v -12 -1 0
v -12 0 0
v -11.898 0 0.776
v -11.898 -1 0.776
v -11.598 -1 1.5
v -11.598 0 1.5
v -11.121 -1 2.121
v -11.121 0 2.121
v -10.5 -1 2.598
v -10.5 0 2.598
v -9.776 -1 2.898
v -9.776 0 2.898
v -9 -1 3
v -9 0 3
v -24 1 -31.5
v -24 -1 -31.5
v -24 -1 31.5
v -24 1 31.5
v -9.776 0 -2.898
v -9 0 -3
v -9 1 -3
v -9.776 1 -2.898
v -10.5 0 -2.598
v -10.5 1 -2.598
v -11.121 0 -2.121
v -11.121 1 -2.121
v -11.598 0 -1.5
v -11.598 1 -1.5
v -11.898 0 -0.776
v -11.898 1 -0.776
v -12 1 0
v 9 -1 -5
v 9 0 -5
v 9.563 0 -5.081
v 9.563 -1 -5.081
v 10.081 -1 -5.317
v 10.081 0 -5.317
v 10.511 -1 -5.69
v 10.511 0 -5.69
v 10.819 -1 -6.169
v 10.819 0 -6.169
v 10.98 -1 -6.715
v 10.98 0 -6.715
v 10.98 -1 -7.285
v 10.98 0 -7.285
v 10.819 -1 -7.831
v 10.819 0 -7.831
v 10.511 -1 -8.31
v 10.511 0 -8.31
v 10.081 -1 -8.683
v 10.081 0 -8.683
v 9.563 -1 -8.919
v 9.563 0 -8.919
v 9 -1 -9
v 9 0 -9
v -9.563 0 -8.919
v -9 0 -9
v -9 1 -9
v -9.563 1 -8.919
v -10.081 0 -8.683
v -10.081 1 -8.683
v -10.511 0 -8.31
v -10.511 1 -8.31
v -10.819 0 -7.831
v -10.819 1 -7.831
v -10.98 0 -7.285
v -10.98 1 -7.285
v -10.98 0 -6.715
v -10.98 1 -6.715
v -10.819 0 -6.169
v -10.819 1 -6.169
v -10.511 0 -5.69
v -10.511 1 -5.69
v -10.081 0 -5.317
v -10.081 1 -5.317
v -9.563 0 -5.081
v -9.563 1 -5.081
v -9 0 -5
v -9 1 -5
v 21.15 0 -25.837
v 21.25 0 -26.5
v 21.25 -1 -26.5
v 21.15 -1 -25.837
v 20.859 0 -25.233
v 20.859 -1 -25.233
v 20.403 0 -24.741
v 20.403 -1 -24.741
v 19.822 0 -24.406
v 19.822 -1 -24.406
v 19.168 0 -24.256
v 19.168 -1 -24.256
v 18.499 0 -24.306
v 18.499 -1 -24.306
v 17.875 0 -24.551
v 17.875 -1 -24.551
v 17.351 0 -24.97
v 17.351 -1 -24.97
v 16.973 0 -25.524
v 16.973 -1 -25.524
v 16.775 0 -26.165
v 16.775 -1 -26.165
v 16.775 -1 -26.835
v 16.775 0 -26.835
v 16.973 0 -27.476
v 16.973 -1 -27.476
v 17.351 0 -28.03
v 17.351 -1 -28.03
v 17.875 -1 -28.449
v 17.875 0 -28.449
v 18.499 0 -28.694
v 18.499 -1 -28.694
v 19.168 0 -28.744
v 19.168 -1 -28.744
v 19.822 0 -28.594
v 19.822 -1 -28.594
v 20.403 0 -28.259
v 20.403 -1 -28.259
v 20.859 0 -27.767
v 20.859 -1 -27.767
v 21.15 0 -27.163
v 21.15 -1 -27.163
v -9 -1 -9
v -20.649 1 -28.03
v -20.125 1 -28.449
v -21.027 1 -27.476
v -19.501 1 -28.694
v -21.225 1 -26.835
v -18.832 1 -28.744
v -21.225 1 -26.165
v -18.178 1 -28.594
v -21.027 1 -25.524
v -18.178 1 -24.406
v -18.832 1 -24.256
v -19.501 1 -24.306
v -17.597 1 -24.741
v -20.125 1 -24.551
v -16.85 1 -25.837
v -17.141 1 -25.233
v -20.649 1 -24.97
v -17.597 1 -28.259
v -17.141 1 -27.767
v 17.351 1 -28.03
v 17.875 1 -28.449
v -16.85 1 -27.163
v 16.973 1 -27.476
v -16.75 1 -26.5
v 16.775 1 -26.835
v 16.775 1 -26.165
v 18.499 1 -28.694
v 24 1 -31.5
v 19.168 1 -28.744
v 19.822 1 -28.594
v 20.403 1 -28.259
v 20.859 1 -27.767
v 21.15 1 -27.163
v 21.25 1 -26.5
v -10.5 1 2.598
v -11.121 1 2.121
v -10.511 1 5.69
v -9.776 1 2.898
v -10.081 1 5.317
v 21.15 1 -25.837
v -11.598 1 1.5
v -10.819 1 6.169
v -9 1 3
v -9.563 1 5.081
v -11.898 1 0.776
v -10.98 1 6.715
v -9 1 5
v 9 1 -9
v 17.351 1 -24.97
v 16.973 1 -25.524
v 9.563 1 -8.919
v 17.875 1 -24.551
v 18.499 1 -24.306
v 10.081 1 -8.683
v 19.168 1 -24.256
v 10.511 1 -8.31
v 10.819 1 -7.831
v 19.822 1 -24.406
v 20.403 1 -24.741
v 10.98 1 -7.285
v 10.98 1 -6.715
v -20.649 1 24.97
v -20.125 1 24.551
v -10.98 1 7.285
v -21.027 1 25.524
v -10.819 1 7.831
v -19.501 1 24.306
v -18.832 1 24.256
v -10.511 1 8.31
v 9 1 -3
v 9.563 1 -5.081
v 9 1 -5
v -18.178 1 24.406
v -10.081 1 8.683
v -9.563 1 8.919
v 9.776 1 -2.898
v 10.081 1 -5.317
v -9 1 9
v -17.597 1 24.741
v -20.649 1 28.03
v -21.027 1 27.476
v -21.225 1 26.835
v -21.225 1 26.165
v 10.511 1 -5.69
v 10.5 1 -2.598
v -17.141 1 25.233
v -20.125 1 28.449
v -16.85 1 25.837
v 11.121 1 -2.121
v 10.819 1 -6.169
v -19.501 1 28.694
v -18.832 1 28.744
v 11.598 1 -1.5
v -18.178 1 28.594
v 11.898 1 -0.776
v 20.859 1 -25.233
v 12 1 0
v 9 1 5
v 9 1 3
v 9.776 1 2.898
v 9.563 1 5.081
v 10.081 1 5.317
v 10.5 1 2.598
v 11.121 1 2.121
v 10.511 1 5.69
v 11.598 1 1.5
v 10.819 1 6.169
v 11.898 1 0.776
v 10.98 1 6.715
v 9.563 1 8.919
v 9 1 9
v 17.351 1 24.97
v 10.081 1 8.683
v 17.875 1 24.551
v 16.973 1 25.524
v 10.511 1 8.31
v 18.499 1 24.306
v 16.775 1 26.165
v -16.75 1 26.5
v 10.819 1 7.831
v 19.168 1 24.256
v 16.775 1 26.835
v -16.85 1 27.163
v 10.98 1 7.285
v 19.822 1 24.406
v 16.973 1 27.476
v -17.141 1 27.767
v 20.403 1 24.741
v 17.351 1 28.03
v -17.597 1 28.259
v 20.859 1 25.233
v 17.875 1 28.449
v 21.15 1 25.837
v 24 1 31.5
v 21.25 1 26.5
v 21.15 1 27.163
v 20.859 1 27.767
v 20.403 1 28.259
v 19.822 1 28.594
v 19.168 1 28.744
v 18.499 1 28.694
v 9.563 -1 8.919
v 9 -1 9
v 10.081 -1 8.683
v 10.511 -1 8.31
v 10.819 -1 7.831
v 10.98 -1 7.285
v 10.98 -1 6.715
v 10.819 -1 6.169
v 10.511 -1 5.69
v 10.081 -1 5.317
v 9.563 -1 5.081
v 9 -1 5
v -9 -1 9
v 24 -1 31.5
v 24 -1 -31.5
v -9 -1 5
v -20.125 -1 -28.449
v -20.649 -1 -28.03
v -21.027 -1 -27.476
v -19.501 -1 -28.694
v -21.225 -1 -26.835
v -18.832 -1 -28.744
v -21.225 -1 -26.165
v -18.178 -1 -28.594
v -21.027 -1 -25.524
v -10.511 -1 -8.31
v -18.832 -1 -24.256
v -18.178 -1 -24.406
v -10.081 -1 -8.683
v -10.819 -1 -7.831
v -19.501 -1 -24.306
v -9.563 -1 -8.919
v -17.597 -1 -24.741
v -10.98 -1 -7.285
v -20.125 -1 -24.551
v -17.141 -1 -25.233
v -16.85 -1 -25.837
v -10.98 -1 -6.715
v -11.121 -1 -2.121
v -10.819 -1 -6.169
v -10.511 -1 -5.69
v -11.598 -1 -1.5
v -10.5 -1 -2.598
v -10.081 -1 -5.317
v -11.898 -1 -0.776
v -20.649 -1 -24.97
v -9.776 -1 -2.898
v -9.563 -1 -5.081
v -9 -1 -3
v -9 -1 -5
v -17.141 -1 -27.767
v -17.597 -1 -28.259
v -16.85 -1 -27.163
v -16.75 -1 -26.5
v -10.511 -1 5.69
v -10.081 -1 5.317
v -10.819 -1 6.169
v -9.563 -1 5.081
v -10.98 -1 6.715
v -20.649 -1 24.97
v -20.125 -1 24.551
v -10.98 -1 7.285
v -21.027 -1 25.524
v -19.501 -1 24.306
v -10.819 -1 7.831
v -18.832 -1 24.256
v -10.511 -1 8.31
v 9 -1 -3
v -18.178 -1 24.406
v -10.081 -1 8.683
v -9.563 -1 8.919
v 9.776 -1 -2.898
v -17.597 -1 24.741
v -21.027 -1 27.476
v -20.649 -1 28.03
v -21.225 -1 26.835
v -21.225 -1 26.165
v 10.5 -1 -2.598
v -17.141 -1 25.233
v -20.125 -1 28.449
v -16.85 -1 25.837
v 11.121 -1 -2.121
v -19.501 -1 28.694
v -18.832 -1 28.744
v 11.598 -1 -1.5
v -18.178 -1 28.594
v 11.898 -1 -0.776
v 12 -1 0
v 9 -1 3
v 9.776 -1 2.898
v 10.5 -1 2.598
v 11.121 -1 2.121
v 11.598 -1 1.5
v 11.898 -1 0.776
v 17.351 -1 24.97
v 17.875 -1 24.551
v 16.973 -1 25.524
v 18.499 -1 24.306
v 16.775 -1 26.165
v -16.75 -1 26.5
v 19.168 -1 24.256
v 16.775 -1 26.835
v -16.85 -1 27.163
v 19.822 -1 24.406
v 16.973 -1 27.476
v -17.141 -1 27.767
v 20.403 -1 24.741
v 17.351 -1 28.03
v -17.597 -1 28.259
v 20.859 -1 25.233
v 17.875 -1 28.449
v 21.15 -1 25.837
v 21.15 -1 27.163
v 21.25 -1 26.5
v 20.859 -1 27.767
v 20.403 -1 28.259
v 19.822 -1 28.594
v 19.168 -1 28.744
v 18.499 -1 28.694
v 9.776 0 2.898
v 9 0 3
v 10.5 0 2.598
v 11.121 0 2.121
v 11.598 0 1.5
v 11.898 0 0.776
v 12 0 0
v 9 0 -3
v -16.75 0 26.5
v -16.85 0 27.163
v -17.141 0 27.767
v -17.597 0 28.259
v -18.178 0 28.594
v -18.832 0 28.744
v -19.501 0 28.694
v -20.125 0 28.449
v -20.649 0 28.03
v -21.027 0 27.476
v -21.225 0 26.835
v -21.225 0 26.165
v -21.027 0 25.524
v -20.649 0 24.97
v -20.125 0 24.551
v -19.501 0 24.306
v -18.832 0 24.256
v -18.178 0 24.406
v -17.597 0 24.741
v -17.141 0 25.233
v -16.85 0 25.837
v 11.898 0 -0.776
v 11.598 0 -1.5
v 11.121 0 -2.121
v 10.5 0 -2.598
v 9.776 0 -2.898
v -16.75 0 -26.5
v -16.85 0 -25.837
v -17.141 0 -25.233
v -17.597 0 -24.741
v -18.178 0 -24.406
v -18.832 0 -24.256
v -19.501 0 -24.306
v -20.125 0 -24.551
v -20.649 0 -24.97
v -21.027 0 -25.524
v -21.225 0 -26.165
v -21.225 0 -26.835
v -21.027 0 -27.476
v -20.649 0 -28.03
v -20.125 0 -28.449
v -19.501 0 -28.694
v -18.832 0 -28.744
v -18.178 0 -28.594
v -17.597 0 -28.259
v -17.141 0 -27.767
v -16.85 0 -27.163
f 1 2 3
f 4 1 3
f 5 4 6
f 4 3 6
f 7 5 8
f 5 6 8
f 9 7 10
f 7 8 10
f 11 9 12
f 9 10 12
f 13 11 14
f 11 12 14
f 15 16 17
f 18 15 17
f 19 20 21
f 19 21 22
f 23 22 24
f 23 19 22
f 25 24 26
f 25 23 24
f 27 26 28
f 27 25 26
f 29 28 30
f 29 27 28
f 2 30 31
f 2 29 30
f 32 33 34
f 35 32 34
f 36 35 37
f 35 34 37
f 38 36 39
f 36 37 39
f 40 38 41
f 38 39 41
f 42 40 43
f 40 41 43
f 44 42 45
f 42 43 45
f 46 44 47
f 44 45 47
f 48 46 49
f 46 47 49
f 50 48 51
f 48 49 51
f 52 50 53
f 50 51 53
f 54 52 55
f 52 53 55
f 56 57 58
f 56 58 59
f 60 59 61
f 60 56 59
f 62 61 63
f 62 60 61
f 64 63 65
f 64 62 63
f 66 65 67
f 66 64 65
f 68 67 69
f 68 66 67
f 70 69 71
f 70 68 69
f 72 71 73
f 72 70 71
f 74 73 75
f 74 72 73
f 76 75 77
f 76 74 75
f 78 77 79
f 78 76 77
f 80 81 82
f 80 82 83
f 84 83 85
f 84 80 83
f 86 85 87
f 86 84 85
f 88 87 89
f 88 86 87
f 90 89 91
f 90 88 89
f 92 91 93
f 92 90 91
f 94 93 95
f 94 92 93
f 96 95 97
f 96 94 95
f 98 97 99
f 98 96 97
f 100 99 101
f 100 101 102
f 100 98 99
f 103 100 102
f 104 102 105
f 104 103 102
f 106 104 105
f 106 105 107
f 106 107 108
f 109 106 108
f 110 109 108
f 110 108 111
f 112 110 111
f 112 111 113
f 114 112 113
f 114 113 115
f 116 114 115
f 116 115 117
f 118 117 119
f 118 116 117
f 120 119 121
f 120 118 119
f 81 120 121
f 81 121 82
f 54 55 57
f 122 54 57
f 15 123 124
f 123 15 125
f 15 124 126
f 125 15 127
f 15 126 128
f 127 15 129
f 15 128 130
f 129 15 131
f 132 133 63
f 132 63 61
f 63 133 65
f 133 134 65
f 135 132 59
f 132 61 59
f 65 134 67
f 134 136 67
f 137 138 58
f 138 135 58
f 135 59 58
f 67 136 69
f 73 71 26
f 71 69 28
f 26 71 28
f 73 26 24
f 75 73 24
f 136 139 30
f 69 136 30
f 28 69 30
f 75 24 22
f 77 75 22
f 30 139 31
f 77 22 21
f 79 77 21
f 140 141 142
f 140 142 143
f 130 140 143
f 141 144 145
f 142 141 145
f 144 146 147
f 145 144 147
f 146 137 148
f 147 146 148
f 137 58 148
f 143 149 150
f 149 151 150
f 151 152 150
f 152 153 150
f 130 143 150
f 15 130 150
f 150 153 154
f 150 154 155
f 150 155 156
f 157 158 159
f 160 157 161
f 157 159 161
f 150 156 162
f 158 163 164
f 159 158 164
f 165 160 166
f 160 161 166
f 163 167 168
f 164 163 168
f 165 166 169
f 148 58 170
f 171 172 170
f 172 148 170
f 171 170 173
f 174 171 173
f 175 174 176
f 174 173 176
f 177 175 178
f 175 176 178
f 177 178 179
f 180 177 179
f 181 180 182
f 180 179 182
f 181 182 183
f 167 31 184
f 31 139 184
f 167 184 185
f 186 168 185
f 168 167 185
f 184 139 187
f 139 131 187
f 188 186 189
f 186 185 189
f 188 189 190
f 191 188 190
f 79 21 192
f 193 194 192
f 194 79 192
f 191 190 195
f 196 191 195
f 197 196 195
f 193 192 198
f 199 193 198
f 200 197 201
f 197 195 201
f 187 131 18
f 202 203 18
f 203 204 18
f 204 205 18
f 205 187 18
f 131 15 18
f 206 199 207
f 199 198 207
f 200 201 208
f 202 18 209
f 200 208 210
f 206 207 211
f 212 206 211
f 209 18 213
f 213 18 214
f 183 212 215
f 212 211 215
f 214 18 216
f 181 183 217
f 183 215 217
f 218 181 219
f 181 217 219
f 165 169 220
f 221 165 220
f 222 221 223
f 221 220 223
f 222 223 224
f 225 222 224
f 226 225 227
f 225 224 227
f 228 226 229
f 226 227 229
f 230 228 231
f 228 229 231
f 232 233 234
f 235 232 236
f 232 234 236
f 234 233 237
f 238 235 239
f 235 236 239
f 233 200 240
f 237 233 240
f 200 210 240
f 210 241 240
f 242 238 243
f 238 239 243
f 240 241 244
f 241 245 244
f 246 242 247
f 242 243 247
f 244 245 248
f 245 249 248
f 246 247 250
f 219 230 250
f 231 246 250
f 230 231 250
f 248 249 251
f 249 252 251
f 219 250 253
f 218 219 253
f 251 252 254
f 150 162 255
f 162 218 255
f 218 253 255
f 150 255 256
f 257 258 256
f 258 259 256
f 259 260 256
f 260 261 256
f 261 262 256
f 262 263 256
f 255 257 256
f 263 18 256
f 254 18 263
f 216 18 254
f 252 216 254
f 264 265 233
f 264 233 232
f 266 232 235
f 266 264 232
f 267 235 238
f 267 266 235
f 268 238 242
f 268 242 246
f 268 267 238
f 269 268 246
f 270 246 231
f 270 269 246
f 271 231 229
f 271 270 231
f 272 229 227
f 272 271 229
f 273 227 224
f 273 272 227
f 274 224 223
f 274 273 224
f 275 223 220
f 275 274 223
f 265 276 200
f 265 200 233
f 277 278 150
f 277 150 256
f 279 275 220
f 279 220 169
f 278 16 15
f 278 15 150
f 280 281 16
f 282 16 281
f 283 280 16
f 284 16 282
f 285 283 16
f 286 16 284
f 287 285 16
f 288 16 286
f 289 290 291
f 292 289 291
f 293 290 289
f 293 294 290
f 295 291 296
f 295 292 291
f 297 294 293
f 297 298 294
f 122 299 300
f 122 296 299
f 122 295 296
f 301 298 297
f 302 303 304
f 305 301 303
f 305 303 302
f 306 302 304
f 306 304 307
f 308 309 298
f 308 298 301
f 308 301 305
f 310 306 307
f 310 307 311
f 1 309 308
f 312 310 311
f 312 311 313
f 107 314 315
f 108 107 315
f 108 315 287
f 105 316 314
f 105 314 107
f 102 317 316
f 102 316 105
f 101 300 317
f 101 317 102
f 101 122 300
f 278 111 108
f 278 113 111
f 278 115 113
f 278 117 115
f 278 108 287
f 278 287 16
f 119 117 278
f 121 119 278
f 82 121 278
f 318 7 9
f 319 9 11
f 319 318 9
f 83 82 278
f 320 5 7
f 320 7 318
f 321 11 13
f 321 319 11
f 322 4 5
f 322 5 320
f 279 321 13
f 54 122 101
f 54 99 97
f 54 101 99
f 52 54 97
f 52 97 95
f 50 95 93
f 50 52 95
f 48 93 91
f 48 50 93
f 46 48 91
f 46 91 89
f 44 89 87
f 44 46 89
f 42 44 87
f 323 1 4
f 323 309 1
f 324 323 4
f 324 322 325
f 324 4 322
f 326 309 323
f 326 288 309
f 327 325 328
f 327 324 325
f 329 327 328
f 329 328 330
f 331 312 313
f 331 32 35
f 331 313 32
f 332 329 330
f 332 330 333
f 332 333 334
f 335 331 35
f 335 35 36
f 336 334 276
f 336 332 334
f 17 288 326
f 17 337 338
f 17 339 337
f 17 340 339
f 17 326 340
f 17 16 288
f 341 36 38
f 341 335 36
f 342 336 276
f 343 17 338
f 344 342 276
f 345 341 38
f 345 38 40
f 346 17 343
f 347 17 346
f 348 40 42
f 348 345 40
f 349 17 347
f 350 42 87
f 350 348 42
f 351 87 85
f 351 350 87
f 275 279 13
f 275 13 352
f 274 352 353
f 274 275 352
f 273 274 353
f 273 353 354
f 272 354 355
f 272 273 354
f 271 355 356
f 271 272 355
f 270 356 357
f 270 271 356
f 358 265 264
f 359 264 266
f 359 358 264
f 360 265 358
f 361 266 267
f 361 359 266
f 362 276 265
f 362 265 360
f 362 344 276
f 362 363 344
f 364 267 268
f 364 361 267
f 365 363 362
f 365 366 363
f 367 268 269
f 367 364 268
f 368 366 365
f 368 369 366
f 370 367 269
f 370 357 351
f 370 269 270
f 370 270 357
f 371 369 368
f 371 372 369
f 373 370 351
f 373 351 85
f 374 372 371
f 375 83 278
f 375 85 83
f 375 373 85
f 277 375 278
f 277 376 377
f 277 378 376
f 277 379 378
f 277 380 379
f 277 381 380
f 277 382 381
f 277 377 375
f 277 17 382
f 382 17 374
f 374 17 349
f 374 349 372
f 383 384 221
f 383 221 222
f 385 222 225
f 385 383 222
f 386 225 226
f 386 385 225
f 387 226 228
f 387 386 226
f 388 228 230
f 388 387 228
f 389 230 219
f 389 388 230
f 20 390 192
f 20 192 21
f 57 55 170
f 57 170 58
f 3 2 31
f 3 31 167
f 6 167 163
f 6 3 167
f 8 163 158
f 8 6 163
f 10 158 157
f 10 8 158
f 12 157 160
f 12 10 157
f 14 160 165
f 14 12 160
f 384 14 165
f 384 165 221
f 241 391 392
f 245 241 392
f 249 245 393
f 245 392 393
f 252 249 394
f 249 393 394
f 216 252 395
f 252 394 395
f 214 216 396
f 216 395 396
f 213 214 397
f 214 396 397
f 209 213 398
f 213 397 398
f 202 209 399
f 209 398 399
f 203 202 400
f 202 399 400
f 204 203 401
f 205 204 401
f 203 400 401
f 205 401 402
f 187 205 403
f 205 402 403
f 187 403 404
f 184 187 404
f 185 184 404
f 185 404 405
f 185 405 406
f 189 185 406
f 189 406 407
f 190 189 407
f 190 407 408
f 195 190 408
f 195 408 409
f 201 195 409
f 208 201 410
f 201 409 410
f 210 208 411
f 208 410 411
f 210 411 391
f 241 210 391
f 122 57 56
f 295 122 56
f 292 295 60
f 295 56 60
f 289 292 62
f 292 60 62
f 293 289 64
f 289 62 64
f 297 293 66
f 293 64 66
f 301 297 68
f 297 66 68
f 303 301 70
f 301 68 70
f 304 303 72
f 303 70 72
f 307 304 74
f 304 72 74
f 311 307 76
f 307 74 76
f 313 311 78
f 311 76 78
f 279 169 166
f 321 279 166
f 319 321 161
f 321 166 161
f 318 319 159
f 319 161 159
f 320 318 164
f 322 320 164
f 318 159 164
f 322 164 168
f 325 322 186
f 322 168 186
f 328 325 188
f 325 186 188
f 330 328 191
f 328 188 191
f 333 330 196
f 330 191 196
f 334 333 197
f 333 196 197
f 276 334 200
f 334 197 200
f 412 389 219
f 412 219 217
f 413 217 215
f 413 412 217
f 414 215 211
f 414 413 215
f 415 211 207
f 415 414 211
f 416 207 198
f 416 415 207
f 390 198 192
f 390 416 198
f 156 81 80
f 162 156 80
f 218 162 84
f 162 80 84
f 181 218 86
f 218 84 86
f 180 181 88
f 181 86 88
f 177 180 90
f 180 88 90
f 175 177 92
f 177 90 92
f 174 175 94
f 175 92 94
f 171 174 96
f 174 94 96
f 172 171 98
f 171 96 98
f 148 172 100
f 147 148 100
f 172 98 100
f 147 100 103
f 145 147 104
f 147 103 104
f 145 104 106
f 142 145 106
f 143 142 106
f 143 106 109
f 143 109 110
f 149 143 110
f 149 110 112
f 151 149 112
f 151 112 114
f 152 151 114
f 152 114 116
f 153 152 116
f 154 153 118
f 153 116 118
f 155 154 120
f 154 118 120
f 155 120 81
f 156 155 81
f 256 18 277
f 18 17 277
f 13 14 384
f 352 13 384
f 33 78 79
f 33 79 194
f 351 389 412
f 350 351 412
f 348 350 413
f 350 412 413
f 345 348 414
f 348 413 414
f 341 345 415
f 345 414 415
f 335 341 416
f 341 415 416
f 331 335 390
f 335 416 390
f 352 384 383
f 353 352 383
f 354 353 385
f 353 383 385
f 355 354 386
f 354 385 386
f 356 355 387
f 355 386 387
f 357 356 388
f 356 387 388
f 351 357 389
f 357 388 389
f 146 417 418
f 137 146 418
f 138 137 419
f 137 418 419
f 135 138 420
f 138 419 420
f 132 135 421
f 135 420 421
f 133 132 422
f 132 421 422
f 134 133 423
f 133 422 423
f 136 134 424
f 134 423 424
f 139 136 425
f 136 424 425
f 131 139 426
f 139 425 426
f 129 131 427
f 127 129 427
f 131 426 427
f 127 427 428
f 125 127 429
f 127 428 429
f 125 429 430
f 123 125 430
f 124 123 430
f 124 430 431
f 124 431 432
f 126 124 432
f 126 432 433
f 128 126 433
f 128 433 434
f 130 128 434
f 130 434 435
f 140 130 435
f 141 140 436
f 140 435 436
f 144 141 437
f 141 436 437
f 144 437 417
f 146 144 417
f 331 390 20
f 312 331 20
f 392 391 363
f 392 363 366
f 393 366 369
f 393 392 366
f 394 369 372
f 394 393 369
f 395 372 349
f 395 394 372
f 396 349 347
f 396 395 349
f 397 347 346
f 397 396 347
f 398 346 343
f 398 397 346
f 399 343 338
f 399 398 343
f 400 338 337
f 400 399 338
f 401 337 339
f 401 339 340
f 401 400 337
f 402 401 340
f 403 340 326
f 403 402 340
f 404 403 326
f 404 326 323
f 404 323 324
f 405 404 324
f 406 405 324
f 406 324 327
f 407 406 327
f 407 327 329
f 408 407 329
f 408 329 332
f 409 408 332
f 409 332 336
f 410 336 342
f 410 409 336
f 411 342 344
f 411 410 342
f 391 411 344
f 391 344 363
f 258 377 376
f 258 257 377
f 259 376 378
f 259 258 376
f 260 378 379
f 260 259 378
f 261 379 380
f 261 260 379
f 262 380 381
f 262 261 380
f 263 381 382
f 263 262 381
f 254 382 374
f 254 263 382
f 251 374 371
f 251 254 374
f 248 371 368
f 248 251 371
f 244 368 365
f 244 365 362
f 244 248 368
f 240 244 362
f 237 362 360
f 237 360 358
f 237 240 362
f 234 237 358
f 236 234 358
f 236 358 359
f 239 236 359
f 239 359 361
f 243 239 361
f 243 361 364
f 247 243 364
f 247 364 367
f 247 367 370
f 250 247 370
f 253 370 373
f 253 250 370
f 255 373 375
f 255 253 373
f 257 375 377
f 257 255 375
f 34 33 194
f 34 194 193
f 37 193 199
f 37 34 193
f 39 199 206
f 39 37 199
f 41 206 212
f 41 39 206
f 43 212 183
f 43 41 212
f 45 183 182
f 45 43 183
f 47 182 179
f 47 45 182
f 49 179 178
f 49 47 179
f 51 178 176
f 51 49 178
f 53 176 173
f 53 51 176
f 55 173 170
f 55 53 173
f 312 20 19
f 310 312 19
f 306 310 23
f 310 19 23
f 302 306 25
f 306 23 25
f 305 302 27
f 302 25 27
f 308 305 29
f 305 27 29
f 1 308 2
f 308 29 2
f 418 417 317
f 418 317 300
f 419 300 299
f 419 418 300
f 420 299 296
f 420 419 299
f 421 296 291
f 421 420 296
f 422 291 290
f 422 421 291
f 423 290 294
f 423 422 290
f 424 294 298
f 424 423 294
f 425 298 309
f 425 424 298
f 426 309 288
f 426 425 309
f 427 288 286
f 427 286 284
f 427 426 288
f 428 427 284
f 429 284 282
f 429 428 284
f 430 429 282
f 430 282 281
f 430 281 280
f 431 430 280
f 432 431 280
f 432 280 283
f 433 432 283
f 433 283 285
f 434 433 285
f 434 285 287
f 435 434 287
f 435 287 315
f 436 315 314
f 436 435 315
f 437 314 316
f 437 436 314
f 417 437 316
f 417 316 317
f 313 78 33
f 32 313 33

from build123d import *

# Parameters (mm, degrees)
F0_W     = 48
F0_H     = 63
F0_R     = 2.25
F1_DEPTH = 1


with BuildPart() as f1:
    # F0 (on Front) → F1 (new body, symmetric)
    with BuildSketch(Plane.XZ):
        Rectangle(F0_W, F0_H)
        with Locations((-19, -26.5)):
            Circle(F0_R, mode=Mode.SUBTRACT)
        with Locations((19, -26.5)):
            Circle(F0_R, mode=Mode.SUBTRACT)
        with BuildLine():
            Line((9, -9), (-9, -9))
            ThreePointArc((-9, -9), (-11, -7), (-9, -5))
            Line((-9, -5), (9, -5))
            ThreePointArc((9, -5), (11, -7), (9, -9))
        make_face(mode=Mode.SUBTRACT)
        with Locations((-19, 26.5)):
            Circle(F0_R, mode=Mode.SUBTRACT)
        with BuildLine():
            Line((9, -3), (-9, -3))
            ThreePointArc((-9, -3), (-11.1213203436, -2.1213203436), (-12, 0))
            ThreePointArc((-12, 0), (-11.1213203436, 2.1213203436), (-9, 3))
            Line((-9, 3), (0, 3))
            Line((0, 3), (9, 3))
            ThreePointArc((9, 3), (11.1213203436, 2.1213203436), (12, 0))
            ThreePointArc((12, 0), (11.1213203436, -2.1213203436), (9, -3))
        make_face(mode=Mode.SUBTRACT)
        with BuildLine():
            Line((9, 5), (-9, 5))
            ThreePointArc((-9, 5), (-11, 7), (-9, 9))
            Line((-9, 9), (9, 9))
            ThreePointArc((9, 9), (11, 7), (9, 5))
        make_face(mode=Mode.SUBTRACT)
        with Locations((19, 26.5)):
            Circle(F0_R, mode=Mode.SUBTRACT)
    extrude(amount=F1_DEPTH, both=True)


solid = f1.part
